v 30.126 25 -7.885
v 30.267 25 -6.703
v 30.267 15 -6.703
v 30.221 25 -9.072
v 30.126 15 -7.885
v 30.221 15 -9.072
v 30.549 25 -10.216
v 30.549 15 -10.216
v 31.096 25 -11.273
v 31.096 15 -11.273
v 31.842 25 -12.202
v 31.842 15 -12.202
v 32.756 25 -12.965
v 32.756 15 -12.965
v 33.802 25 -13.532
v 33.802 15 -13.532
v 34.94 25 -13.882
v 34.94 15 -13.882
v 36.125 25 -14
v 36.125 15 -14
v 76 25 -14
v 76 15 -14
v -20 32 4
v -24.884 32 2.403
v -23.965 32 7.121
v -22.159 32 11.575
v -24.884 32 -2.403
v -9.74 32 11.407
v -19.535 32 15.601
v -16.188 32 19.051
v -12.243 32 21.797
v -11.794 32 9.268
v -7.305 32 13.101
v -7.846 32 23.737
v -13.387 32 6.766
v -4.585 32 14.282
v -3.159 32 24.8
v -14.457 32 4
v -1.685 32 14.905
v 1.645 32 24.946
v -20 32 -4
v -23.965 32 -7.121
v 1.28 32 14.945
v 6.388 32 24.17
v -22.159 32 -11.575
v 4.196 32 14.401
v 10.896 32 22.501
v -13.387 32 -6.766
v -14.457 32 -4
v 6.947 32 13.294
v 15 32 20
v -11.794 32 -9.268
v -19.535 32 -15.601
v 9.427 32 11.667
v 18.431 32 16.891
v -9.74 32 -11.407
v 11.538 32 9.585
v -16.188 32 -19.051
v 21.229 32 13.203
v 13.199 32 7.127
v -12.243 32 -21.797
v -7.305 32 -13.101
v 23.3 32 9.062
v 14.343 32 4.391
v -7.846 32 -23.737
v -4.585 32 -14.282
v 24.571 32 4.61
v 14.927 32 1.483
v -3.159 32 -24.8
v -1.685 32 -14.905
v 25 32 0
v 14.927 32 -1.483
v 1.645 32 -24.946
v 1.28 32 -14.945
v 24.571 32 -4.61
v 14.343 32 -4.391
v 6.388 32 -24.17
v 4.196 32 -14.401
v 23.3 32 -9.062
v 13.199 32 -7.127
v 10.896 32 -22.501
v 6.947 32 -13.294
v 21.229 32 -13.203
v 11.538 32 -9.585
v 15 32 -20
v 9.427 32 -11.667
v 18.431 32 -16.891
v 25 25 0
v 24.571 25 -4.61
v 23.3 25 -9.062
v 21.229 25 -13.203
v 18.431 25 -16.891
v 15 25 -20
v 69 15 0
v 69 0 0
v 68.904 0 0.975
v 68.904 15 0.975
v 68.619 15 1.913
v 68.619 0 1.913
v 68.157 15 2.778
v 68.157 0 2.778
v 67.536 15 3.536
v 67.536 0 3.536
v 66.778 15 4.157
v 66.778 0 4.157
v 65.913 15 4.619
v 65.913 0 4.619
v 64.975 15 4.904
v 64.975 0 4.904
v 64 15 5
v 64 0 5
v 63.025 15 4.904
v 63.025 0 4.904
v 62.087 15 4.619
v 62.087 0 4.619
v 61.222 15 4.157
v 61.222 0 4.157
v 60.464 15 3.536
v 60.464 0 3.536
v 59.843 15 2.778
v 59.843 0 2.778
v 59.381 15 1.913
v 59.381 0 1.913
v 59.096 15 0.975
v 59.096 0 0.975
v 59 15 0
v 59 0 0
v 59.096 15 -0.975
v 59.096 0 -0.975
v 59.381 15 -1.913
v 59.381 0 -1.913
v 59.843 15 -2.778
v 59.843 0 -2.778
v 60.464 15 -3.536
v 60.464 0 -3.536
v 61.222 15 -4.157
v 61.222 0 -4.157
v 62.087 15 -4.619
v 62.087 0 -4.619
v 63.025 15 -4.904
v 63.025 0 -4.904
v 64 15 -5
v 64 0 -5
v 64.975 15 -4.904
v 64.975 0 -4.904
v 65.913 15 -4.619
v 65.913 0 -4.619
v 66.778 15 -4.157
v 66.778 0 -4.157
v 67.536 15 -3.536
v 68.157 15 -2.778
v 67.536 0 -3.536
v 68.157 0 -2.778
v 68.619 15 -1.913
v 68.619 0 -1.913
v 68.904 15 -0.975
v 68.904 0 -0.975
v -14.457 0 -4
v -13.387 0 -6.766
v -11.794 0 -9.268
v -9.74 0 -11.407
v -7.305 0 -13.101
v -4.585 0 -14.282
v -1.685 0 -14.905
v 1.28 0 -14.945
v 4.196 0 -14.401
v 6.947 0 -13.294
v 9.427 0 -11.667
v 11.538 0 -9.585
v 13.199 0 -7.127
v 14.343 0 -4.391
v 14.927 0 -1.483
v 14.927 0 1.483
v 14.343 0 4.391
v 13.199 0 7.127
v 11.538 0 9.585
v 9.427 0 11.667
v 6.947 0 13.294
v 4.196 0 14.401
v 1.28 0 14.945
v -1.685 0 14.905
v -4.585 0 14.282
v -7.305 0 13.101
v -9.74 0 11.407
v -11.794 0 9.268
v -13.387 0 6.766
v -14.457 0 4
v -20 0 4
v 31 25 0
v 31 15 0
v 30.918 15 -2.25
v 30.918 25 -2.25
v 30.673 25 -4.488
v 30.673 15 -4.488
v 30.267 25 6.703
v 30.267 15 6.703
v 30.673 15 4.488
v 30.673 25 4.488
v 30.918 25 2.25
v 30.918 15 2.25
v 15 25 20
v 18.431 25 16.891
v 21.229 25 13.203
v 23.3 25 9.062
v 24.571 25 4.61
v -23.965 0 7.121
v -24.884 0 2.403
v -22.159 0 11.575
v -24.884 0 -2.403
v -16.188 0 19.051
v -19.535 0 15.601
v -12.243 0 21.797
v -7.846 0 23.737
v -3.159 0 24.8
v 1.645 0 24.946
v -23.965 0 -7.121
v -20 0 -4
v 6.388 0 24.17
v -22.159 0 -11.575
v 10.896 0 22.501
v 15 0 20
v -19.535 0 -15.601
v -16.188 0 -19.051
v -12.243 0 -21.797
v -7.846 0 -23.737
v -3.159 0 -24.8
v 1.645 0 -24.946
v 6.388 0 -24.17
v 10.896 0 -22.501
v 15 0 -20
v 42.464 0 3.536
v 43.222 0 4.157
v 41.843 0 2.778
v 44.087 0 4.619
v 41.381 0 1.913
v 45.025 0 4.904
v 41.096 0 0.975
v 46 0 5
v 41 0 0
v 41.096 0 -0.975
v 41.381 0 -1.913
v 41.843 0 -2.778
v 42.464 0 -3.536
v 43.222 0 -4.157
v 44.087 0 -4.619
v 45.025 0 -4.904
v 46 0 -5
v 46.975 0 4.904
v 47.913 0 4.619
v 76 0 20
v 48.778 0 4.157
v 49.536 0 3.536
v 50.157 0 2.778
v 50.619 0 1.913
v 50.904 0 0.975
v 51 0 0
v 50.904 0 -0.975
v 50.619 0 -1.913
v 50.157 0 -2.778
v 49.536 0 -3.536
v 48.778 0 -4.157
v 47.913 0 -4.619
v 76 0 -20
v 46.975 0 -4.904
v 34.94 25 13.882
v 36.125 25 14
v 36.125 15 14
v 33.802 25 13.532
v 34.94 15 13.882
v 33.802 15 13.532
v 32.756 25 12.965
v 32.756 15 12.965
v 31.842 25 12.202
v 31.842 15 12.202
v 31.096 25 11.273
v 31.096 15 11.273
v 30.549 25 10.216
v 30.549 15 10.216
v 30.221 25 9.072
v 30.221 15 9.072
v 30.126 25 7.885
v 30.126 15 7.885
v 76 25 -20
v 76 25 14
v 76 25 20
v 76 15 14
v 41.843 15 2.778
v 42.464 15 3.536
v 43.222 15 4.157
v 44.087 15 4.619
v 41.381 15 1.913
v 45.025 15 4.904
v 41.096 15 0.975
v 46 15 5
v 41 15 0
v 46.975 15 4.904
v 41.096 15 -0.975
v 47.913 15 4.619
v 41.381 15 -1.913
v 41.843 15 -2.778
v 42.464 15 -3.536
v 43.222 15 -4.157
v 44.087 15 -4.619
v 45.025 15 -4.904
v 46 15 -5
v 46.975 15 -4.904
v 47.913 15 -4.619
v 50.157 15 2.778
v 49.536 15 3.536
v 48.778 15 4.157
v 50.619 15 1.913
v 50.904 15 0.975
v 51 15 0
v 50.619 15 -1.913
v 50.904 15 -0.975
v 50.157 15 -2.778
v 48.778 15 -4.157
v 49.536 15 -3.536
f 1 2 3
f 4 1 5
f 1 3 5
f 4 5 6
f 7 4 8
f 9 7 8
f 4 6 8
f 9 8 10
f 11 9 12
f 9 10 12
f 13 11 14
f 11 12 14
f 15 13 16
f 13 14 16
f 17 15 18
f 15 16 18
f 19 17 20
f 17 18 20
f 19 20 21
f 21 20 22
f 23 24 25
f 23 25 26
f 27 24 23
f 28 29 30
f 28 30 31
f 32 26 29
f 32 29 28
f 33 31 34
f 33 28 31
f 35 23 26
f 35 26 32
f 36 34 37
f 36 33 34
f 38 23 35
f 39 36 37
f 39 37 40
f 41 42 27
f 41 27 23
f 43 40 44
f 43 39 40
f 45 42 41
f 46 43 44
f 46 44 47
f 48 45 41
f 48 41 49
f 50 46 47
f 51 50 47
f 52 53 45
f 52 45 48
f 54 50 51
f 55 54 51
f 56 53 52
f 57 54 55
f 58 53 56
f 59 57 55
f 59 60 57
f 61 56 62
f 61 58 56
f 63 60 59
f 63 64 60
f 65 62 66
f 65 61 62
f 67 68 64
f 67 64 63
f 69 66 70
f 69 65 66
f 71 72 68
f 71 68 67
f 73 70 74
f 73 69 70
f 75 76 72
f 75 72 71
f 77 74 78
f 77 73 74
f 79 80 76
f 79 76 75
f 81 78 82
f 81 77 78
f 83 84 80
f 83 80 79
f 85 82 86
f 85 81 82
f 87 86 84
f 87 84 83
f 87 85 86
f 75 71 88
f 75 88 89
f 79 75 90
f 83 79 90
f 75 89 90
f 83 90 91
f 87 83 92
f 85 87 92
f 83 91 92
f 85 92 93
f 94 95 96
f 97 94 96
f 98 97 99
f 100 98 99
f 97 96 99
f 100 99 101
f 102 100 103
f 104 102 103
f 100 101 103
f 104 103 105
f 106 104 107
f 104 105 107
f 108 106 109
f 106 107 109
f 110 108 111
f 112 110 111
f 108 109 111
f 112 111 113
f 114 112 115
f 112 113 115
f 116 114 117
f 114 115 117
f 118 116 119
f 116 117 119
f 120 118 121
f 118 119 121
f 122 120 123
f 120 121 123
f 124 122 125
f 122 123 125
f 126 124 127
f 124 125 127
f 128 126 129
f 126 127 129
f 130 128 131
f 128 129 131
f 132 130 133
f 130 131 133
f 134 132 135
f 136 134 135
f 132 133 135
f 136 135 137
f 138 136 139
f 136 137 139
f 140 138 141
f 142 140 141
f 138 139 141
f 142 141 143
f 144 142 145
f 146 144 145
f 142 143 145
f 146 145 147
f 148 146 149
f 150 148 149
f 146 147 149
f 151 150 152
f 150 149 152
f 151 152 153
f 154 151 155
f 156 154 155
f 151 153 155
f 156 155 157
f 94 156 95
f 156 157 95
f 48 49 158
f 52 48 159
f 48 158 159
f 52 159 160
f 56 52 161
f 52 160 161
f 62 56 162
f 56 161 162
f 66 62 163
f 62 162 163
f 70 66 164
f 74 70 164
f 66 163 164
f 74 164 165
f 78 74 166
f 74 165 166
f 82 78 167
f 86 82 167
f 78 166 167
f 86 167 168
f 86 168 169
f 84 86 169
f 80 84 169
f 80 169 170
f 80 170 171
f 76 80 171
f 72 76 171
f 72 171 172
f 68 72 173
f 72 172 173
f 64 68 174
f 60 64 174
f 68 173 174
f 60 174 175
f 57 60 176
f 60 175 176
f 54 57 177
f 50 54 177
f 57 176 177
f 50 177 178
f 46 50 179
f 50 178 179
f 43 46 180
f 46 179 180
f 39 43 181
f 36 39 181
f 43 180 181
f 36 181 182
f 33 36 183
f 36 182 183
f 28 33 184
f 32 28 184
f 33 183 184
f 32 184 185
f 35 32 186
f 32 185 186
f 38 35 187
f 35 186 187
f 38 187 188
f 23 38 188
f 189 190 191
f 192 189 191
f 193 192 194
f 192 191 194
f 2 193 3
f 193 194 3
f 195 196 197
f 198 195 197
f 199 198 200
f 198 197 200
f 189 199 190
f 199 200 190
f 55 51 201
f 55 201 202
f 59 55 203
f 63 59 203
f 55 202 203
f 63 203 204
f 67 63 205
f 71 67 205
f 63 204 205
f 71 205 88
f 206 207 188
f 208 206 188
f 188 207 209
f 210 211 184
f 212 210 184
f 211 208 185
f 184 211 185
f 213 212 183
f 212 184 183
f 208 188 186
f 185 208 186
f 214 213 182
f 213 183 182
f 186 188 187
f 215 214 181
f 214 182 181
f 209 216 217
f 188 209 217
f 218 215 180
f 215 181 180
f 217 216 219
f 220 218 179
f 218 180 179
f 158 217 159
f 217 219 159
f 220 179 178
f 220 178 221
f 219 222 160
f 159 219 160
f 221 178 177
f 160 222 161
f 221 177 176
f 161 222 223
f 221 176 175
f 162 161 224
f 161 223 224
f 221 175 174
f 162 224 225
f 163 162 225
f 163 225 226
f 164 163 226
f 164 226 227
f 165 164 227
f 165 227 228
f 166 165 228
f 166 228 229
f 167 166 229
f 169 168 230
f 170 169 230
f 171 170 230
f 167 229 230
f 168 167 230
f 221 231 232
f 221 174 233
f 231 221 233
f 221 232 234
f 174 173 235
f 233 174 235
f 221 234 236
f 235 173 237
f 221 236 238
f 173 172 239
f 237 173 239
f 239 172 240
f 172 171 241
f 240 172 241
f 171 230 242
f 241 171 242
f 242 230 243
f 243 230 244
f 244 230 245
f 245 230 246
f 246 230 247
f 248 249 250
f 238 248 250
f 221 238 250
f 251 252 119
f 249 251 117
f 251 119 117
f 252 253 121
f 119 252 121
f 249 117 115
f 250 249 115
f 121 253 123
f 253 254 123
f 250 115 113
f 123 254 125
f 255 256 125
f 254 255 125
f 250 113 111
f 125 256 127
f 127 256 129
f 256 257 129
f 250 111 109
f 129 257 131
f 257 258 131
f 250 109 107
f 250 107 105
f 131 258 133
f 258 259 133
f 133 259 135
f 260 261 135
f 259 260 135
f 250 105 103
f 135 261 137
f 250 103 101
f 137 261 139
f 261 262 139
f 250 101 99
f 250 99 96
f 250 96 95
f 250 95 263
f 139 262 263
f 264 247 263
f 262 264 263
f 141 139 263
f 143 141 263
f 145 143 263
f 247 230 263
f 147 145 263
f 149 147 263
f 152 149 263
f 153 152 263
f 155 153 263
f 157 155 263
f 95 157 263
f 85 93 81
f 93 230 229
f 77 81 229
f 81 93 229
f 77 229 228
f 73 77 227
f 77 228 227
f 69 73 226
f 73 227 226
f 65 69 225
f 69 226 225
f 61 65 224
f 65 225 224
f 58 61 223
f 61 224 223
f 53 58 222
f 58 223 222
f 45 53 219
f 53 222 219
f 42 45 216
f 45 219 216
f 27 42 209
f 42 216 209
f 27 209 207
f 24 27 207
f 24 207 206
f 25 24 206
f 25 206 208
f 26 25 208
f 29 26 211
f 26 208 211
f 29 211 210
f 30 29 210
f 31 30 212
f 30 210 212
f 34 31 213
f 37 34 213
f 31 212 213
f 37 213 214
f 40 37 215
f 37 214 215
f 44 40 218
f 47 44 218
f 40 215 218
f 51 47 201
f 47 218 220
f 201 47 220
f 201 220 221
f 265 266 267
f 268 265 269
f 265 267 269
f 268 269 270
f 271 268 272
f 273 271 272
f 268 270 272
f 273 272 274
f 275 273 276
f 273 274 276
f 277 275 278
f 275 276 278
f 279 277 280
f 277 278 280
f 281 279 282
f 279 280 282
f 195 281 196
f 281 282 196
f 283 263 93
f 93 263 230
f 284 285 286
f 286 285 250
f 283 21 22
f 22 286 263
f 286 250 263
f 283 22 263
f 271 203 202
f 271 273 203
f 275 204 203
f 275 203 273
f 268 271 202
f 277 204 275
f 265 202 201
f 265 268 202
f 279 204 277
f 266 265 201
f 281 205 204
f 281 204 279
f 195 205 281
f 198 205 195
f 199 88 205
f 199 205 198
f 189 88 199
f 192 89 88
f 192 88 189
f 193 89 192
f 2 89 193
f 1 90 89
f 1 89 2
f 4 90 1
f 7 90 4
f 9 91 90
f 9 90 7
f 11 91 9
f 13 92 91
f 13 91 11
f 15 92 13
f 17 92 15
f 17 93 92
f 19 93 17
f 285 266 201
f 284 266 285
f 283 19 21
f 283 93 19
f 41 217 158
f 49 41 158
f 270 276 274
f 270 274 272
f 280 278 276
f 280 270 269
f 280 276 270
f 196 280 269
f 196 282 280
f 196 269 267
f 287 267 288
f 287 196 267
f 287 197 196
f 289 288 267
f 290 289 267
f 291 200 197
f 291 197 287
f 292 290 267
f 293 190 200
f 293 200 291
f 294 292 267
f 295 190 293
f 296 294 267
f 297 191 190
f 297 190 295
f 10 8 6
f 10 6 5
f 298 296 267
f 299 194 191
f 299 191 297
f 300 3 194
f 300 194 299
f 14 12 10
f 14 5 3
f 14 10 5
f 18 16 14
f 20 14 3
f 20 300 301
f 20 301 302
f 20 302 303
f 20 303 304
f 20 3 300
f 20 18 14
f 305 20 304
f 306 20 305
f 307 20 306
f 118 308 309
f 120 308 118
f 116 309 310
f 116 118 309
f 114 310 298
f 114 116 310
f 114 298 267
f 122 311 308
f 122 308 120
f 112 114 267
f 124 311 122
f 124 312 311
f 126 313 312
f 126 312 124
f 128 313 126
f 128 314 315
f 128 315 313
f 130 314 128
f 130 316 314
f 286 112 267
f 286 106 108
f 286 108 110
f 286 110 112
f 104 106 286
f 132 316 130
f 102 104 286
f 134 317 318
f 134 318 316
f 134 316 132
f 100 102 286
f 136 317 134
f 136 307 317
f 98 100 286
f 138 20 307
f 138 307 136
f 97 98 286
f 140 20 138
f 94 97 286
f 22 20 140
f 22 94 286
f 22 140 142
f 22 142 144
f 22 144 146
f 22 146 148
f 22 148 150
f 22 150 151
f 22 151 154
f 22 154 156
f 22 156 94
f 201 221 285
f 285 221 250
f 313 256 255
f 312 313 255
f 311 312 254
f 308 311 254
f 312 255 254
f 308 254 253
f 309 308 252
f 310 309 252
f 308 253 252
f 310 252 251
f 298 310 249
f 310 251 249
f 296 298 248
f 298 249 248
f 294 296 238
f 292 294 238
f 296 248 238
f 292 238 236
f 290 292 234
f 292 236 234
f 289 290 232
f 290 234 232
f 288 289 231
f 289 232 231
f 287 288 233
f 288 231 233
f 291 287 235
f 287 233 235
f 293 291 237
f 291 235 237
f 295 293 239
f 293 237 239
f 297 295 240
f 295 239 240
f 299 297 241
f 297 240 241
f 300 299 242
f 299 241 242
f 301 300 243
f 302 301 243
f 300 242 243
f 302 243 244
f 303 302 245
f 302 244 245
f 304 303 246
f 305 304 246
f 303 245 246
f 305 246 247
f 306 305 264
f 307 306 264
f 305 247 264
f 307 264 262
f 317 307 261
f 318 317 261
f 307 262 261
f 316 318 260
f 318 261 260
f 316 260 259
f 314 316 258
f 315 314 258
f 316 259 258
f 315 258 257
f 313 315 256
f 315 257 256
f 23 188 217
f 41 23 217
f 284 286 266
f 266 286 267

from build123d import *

# Parameters (mm, degrees)
EXTRUDE_1_DEPTH = 32
EXTRUDE_2_DEPTH = 25
EXTRUDE_3_DEPTH = 15


with BuildPart() as part:
    # 草图1 → 凸台-拉伸1 (new body)
    with BuildSketch(Plane(origin=(0, 0, 0), x_dir=(1, 0, 0), z_dir=(0, 1, 0))):
        with BuildLine():
            ThreePointArc((15, -20), (22.360679775, -11.180339887), (25, 0))
            ThreePointArc((25, 0), (22.360679775, 11.180339887), (15, 20))
            ThreePointArc((15, 20), (-25, 0), (15, -20))
        make_face()
        with BuildLine():
            Line((-20, 0), (-20, 4))
            Line((-20, 4), (-14.456832295, 4))
            ThreePointArc((-14.456832295, 4), (15, 0), (-14.456832295, -4))
            Line((-14.456832295, -4), (-20, -4))
            Line((-20, -4), (-20, 0))
        make_face(mode=Mode.SUBTRACT)
    extrude(amount=EXTRUDE_1_DEPTH)

    # 草图1<3> → 凸台-拉伸2 (add)
    with BuildSketch(Plane(origin=(0, 0, 0), x_dir=(1, 0, 0), z_dir=(0, 1, 0))):
        with BuildLine():
            ThreePointArc((15, 20), (25, 0), (15, -20))
            Line((15, -20), (76, -20))
            Line((76, -20), (76, -14))
            Line((76, -14), (36.124783736, -14))
            ThreePointArc((36.124783736, -14), (31.445906532, -11.756076158), (30.266710698, -6.702702703))
            ThreePointArc((30.266710698, -6.702702703), (31, 0), (30.266710698, 6.702702703))
            ThreePointArc((30.266710698, 6.702702703), (31.445906532, 11.756076158), (36.124783736, 14))
            Line((36.124783736, 14), (76, 14))
            Line((76, 14), (76, 20))
            Line((76, 20), (15, 20))
        make_face()
    extrude(amount=EXTRUDE_2_DEPTH)

    # 草图1<4> → 凸台-拉伸3 (add)
    with BuildSketch(Plane(origin=(0, 0, 0), x_dir=(1, 0, 0), z_dir=(0, 1, 0))):
        with BuildLine():
            ThreePointArc((30.266710698, 6.702702703), (30.816132396, 3.371347532), (31, 0))
            ThreePointArc((31, 0), (30.816132396, -3.371347532), (30.266710698, -6.702702703))
            ThreePointArc((30.266710698, -6.702702703), (31.445906532, -11.756076158), (36.124783736, -14))
            Line((36.124783736, -14), (76, -14))
            Line((76, -14), (76, 0))
            Line((76, 0), (76, 14))
            Line((76, 14), (36.124783736, 14))
            ThreePointArc((36.124783736, 14), (31.445906532, 11.756076158), (30.266710698, 6.702702703))
        make_face()
        with BuildLine():
            ThreePointArc((41, 0), (46, 5), (51, 0))
            ThreePointArc((51, 0), (46, -5), (41, 0))
        make_face(mode=Mode.SUBTRACT)
        with BuildLine():
            ThreePointArc((59, 0), (64, 5), (69, 0))
            ThreePointArc((69, 0), (64, -5), (59, 0))
        make_face(mode=Mode.SUBTRACT)
    extrude(amount=EXTRUDE_3_DEPTH)


solid = part.part
